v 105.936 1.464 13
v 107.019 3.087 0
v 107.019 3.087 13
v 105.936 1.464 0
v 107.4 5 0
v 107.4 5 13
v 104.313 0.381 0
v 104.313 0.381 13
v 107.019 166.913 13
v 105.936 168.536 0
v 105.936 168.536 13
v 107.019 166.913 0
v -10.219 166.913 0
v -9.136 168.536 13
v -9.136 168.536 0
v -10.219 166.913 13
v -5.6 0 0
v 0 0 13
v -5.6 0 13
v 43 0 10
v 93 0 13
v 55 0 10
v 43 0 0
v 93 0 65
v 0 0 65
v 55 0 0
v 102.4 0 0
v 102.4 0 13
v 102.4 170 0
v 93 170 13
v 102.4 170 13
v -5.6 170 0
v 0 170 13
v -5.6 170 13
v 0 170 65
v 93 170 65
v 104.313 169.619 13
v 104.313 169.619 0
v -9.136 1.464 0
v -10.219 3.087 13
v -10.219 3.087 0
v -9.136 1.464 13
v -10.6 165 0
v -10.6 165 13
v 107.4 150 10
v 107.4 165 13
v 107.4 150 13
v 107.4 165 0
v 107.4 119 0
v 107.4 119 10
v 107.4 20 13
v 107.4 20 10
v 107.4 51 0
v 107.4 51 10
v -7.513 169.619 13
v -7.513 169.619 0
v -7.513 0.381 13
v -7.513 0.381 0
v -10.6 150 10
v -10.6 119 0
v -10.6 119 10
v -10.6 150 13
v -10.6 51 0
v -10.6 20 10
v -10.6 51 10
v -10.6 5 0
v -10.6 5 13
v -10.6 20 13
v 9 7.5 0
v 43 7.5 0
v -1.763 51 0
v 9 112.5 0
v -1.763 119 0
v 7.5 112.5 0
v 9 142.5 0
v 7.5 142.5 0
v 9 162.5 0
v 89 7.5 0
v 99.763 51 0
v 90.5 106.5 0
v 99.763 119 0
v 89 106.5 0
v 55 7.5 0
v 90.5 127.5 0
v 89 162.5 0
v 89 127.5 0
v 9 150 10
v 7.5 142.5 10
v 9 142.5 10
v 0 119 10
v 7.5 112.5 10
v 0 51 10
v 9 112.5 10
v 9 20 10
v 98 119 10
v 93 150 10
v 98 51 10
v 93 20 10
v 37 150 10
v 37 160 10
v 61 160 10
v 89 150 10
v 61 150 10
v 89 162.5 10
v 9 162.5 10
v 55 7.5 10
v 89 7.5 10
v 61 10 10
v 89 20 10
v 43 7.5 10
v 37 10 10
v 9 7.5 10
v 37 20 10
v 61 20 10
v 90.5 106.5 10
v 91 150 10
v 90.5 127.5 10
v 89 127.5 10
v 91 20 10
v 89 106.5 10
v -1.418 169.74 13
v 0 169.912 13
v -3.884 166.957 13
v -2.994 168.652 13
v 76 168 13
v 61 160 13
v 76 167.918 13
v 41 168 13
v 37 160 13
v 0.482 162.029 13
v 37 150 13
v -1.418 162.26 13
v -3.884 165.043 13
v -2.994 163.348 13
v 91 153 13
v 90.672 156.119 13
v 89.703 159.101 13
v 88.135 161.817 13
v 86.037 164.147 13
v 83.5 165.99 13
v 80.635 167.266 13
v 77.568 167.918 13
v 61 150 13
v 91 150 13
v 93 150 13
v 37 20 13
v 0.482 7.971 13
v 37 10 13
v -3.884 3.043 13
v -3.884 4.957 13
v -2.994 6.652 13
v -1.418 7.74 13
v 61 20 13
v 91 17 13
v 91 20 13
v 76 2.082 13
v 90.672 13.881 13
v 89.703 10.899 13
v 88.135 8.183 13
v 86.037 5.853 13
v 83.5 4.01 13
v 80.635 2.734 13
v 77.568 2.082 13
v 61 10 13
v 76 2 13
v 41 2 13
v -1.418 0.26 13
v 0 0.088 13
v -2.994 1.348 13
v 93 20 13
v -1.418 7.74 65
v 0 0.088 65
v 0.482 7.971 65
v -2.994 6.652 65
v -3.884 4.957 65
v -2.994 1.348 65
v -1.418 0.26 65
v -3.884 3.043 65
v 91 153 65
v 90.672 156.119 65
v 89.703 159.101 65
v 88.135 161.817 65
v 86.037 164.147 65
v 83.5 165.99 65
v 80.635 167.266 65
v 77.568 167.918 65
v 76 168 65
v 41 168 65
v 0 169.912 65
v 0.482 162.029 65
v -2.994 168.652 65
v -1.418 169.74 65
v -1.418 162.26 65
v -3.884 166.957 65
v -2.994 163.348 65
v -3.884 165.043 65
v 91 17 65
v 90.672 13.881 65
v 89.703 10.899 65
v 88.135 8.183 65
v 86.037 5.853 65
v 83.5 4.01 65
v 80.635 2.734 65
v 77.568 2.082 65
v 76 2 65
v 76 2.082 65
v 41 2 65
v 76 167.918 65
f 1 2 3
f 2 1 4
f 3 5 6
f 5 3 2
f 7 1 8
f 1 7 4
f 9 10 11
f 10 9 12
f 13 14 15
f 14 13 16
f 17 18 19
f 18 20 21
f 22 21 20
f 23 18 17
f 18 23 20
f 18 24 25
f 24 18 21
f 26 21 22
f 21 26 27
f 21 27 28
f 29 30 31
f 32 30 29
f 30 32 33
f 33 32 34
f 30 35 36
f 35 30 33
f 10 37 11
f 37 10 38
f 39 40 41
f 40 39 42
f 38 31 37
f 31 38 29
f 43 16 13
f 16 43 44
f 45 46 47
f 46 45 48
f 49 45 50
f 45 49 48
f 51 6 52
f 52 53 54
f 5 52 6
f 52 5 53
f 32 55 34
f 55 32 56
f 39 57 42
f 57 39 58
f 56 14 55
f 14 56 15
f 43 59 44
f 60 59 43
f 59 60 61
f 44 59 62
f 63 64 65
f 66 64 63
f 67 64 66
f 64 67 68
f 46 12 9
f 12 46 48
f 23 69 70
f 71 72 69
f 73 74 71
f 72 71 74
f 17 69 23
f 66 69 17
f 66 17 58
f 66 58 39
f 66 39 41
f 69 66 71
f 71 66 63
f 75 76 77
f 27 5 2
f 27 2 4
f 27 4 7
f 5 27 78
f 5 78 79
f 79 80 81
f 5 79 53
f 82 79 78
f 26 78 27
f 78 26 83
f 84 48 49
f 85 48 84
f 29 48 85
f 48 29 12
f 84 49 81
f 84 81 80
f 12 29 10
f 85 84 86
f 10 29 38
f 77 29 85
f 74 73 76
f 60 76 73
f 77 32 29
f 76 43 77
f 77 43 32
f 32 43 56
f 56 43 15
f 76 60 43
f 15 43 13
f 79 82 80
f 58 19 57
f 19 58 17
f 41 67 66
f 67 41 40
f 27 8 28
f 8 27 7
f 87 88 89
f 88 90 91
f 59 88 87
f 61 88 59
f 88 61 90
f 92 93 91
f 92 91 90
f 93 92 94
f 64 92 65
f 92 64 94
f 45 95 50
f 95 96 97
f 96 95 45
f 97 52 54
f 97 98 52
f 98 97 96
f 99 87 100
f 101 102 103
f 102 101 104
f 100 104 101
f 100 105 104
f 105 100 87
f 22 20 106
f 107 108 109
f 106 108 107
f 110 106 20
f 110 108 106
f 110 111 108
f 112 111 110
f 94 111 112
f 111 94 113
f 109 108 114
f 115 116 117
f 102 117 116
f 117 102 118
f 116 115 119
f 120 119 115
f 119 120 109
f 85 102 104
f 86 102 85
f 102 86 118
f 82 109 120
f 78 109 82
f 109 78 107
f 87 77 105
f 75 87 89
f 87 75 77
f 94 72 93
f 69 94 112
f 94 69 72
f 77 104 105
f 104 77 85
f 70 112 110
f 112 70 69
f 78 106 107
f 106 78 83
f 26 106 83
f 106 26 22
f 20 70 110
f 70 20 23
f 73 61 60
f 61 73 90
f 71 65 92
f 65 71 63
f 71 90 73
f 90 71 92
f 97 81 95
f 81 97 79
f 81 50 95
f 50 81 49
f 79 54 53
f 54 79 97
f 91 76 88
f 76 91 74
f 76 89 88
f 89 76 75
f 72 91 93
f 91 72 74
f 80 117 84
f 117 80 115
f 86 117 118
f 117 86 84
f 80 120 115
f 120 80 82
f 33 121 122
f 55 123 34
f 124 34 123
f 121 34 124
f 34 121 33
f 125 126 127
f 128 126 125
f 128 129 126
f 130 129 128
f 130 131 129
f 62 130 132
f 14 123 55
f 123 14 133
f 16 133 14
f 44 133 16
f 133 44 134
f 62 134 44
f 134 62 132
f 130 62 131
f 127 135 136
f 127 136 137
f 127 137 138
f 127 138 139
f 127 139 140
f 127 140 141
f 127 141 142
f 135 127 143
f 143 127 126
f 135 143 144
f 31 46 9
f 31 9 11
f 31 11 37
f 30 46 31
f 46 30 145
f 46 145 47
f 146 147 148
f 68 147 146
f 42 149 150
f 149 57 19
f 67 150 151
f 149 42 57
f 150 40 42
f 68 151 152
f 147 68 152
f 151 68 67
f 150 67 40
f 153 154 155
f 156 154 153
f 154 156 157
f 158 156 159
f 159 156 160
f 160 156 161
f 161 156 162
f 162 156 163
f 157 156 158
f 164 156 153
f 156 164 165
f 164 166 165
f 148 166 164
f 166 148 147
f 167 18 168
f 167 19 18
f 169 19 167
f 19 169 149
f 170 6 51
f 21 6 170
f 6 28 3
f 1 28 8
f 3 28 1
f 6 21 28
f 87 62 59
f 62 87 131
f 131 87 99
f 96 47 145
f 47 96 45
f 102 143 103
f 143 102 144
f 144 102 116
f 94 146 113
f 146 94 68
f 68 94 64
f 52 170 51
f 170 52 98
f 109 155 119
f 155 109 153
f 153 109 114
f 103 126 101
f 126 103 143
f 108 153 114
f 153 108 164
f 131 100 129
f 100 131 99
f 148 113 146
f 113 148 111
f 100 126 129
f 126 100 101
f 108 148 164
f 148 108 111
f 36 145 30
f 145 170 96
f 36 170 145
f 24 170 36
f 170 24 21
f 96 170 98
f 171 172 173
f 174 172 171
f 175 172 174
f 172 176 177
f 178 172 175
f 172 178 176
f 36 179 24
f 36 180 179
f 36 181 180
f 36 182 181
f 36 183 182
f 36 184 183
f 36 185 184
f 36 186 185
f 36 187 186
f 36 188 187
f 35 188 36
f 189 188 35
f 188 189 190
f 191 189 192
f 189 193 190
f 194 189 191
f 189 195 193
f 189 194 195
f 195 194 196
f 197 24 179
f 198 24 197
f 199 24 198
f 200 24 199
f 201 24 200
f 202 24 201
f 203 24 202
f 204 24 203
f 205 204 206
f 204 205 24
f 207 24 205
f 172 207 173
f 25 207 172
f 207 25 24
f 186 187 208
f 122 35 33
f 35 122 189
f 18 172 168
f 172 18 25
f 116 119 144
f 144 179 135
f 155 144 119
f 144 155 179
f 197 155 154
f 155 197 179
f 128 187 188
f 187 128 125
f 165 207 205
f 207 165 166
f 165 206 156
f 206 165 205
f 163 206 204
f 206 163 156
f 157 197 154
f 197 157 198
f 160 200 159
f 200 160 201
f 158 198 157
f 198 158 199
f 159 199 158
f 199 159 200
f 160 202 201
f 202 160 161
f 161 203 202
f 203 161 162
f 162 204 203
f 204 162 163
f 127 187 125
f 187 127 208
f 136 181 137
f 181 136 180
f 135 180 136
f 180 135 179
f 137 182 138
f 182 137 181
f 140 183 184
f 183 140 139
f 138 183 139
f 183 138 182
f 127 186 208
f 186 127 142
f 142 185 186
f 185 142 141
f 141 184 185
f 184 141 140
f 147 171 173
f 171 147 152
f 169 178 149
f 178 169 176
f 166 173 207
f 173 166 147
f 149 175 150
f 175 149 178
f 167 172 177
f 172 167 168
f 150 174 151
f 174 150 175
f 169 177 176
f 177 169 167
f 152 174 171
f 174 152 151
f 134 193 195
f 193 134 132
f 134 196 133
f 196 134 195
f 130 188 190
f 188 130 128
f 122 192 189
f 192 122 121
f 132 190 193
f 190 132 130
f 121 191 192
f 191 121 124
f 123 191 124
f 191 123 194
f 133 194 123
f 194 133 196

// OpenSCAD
// Depth of the Sun Shade
Sunshade_Depth = 55; // [0:100]
 
// Width of Device
device_x = 80; // [75:85]

// Height of Device (Try 152 for Galaxy Note 3)
device_y = 155; // [150:160]

// Depth of Device (including back)
Device_Depth = 10; // [9:12]

module dont_customize(){}

outside_x = 118;
outside_xo = 10.6;
outside_cut_y = 68;
step = 1.5;

base_x = 98;
base_y = 170;
base_z = Device_Depth;

screen_z = 3;
screen_xo= 5;
screen_y = 130;

button_r_y1 = 35;
button_r_y2 = 56;

button_l_y1 = 20;
button_l_y2 = 50;

buttons_x = 1.5;

device_cut_y = 10;
device_cut_x = 24;

button_cut_xo = 16;

shade_z = Sunshade_Depth;
shade_w = 2;

usb_x = 12;

post_y = 2;
post_x = 6;
post_d = 8;

curve_r = 15;

big = 50;

buttons_ry1 = device_y-button_r_y1;
buttons_ry2 = device_y-button_r_y2;
buttons_ly1 = device_y-button_l_y1;
buttons_ly2 = device_y-button_l_y2;

rnd = 5;

// base block
difference(){

    translate([-outside_xo,0,0])roundcube([outside_x,base_y,base_z]);  

translate([(base_x-device_x)/2,(base_y-device_y)/2,0]) cube(size=[device_x,device_y,base_z]);
translate([(base_x-usb_x)/2,-base_y/2,0]) cube([usb_x,base_y,base_z]);

translate([0,(base_y-outside_cut_y)/2,0]) translate([0,0,base_z]) rotate([0,10,0]) translate([-big,0,-big]) cube([big,outside_cut_y,big]);

translate([base_x,(base_y-outside_cut_y)/2,0]) translate([0,0,base_z]) rotate([0,-10,0]) translate([0,0,-big]) cube([big,outside_cut_y,big]);

// buttons
translate([0,buttons_ly2+(base_y-device_y)/2,0]) translate([(base_x-device_x)/2-buttons_x,0,0]) cube([buttons_x,buttons_ly1-buttons_ly2,base_z]);
translate([device_x,buttons_ry2+(base_y-device_y)/2,0]) translate([(base_x-device_x)/2,0,0]) cube([buttons_x,buttons_ry1-buttons_ry2,base_z]);
}
// left and right tabs
translate([0,0,base_z]) difference(){
translate([-outside_xo,0,0]) roundcube([outside_x,base_y,screen_z]);
translate([-outside_xo,(base_y-screen_y)/2,0]) cube(size=[base_x+2*outside_xo,screen_y,screen_z]);
translate([(base_x-device_cut_x)/2,(base_y-screen_y)/2-device_cut_y,0]) cube(size=[device_cut_x,screen_y+2*device_cut_y,screen_z]);
}
// screen
translate([0,0,base_z]) difference(){
    translate([0,0,0]) cube([base_x-screen_xo,base_y,shade_z]);
    translate([0,shade_w,0]) cube([base_x-1*shade_w-screen_xo,base_y-2*shade_w,shade_z]);
 
}
// posts
translate([0,0,base_z]) 
{
    
hull(){
    translate([0,post_d/2,0]) cylinder(h=shade_z,d=post_d);
    translate([device_x/2,0,0]) cube([1,shade_w,shade_z]);
}
translate([0,base_y-post_d,0])
hull(){
    translate([0,post_d/2,0]) cylinder(h=shade_z,d=post_d);
    translate([device_x/2,post_d-shade_w,0]) cube([1,shade_w,shade_z]);
}

translate([base_x-screen_xo-curve_r-shade_w,0,0])
{
    difference(){
        cube([curve_r+shade_w,curve_r+shade_w,shade_z]);
translate([0,curve_r+shade_w,0]) cylinder(r=curve_r,h=shade_z);
}}
translate([base_x-screen_xo-curve_r-shade_w,base_y-curve_r-shade_w,0]){
    difference(){
        cube([curve_r+shade_w,curve_r+shade_w,shade_z]);
translate([0,0,0]) cylinder(r=curve_r,h=shade_z);
    }
}

}

module roundcube(v){
    translate([rnd,rnd,v[2]/4]) minkowski(){
    cube([v[0]-2*rnd,v[1]-2*rnd,v[2]/2]);
    cylinder(r=rnd,h=v[2]/2,center=true);
    }
}

    
